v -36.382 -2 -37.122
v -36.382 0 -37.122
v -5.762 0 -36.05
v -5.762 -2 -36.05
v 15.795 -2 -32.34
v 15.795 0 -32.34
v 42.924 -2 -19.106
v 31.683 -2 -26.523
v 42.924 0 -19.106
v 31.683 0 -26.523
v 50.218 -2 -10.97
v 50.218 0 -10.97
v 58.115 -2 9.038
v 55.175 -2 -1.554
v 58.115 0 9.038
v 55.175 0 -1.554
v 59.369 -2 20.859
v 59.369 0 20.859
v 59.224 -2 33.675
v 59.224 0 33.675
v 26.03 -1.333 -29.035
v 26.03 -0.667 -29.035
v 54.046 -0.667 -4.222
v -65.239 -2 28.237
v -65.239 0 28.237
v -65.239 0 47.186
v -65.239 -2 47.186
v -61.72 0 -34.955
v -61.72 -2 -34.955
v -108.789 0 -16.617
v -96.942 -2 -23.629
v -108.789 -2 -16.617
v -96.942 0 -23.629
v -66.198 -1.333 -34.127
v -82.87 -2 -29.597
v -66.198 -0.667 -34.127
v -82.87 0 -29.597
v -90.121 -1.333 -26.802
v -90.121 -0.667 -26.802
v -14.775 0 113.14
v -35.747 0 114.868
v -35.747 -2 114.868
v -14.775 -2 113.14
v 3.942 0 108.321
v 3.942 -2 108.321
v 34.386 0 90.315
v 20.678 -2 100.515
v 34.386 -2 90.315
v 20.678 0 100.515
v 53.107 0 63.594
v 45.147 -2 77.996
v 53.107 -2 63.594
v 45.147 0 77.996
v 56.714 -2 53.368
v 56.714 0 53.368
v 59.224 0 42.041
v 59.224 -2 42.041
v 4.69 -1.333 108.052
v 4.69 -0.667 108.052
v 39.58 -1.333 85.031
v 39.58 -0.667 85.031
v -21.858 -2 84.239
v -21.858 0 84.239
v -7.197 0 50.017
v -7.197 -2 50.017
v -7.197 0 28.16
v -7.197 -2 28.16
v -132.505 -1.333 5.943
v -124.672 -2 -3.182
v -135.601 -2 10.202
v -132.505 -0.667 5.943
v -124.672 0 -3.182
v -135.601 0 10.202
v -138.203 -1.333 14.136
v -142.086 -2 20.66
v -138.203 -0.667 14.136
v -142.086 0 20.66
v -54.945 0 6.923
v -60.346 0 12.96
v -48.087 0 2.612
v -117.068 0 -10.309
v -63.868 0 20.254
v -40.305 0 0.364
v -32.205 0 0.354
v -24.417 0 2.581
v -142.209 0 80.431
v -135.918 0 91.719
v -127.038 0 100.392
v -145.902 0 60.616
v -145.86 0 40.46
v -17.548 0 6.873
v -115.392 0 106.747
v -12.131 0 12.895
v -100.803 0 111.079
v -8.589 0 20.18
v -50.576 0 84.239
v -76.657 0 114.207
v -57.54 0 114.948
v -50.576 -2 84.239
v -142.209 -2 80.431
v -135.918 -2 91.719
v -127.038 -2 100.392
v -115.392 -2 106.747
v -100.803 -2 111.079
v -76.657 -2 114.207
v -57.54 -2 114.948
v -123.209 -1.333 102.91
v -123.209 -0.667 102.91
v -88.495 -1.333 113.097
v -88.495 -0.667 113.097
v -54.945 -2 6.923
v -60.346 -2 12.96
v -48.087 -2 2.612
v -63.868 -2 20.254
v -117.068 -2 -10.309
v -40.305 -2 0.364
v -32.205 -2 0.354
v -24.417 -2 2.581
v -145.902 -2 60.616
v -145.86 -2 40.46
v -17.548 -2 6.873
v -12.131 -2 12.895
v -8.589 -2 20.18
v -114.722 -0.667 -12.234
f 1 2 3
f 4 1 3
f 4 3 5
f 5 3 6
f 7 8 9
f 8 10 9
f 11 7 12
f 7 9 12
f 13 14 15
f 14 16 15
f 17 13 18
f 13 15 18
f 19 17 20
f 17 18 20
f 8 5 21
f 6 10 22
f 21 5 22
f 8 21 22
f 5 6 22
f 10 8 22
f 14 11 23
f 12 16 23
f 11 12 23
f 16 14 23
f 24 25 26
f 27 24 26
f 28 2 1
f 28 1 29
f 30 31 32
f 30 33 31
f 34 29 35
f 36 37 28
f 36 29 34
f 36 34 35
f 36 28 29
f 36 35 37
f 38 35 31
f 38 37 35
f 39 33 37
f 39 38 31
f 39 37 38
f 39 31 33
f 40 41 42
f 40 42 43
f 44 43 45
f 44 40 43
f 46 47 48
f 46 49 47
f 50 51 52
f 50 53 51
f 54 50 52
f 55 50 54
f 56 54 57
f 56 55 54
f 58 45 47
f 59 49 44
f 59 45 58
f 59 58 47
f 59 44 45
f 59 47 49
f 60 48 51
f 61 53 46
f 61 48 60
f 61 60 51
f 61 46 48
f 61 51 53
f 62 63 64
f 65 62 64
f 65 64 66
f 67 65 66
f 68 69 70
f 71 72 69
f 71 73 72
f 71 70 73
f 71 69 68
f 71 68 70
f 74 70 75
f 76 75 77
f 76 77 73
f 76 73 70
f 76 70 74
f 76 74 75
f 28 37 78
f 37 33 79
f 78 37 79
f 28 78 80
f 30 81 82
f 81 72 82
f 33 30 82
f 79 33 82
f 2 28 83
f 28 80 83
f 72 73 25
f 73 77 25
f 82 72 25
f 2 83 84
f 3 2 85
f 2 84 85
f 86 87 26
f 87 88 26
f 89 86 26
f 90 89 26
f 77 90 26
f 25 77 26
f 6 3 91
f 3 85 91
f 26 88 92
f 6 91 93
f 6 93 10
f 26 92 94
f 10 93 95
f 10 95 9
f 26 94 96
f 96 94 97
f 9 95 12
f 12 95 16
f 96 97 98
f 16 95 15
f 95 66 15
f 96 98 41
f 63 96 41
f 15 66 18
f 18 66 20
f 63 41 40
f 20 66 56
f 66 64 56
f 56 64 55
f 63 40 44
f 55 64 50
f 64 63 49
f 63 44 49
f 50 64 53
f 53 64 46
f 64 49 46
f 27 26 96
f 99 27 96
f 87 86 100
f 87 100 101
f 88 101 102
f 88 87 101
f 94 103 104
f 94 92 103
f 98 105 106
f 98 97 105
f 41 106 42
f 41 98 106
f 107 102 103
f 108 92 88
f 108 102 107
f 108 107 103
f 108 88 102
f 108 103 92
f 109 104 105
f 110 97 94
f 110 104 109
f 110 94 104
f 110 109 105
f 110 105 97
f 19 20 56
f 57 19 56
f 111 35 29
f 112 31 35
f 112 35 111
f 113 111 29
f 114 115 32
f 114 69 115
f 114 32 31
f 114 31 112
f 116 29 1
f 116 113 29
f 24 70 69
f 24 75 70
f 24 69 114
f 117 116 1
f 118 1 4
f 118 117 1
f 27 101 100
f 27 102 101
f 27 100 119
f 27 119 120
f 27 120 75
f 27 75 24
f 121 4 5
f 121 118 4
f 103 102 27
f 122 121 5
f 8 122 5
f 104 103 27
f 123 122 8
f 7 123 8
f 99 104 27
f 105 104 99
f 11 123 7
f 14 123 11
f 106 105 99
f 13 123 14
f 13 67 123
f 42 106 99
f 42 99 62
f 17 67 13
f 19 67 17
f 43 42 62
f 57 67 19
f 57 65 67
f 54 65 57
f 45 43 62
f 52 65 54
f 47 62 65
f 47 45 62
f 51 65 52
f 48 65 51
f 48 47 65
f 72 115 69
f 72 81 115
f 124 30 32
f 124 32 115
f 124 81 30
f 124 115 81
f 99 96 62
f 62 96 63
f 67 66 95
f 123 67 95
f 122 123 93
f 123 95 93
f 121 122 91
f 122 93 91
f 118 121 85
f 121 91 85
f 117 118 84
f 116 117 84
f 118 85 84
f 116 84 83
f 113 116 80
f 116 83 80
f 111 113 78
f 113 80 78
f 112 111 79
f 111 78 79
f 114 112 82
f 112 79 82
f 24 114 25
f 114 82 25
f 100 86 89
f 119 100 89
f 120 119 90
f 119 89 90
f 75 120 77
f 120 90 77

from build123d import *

# Parameters (mm, degrees)
F1_DEPTH = 2


with BuildPart() as f1:
    # F0 (on Front) → F1 (new body)
    with BuildSketch(Plane.XZ):
        with BuildLine():
            Line((-124.6721289065, 66.9943112569), (-124.6721289065, -3.1820335149))
            add(Edge.make_bspline(
                [(-108.7886020541, -16.6170091142), (-115.0603290285, -12.3232285742), (-120.2999981868, -7.7183339998), (-124.6721289065, -3.1820335149)],
                knots=[0.4585261262, 0.4585261262, 0.4585261262, 0.4585261262, 0.6354781501, 0.6354781501, 0.6354781501, 0.6354781501], degree=3))
            Line((-108.7886020541, -16.6170091142), (-108.7886020541, 66.9943112569))
            Line((-108.7886020541, 66.9943112569), (-124.6721289065, 66.9943112569))
        make_face()
        with BuildLine():
            add(Edge.make_bspline(
                [(-142.2094079373, 80.4314068878), (-130.2931281445, 110.3476141939), (-98.2848527548, 116.0134827146), (-35.7470019427, 114.8680118272)],
                knots=[0, 0, 0, 0, 1, 1, 1, 1], degree=3))
            ThreePointArc((-142.2094079373, 80.4314068878), (-146.3504948166, 50.5368703201), (-142.0856537936, 20.6597377906))
            add(Edge.make_bspline(
                [(-124.6721289065, -3.1820335149), (-133.6787350082, 6.1627629347), (-139.0038412424, 15.2164724191), (-142.0856537936, 20.6597377906)],
                knots=[0.6354781501, 0.6354781501, 0.6354781501, 0.6354781501, 1, 1, 1, 1], degree=3))
            Line((-124.6721289065, -3.1820335149), (-124.6721289065, 66.9943112569))
            Line((-124.6721289065, 66.9943112569), (-108.7886020541, 66.9943112569))
            Line((-108.7886020541, 66.9943112569), (-108.7886020541, -16.6170091142))
            add(Edge.make_bspline(
                [(-36.381947872, -37.122189497), (-69.3556272485, -36.7804960017), (-92.5370180869, -27.743248389), (-108.7886020541, -16.6170091142)],
                knots=[0, 0, 0, 0, 0.4585261262, 0.4585261262, 0.4585261262, 0.4585261262], degree=3))
            add(Edge.make_bspline(
                [(-36.381947872, -37.122189497), (47.0810634374, -38.6126036396), (61.6125640752, -9.5495949141), (59.2237142208, 33.6754252563)],
                knots=[0, 0, 0, 0, 1, 1, 1, 1], degree=3))
            Line((59.2237142208, 33.6754252563), (59.2237142208, 42.0407210837))
            add(Edge.make_bspline(
                [(-35.7470019427, 114.8680118272), (4.2317536953, 114.8997140476), (50.434487808, 96.2695801058), (59.2237142208, 42.0407210837)],
                knots=[0, 0, 0, 0, 1, 1, 1, 1], degree=3))
        make_face()
        with BuildLine():
            Line((-65.2386816857, 47.185676674), (-50.5756217741, 84.2391779074))
            Line((-50.5756217741, 84.2391779074), (-21.8579741833, 84.2391779074))
            Line((-21.8579741833, 84.2391779074), (-7.197354984, 50.0167762288))
            Line((-7.197354984, 50.0167762288), (-7.197354984, 28.1597529901))
            ThreePointArc((-7.197354984, 28.1597529901), (-36.2556737781, 0.0750783929), (-65.2386816857, 28.237466271))
            Line((-65.2386816857, 28.237466271), (-65.2386816857, 47.185676674))
        make_face(mode=Mode.SUBTRACT)
    extrude(amount=F1_DEPTH)


solid = f1.part
